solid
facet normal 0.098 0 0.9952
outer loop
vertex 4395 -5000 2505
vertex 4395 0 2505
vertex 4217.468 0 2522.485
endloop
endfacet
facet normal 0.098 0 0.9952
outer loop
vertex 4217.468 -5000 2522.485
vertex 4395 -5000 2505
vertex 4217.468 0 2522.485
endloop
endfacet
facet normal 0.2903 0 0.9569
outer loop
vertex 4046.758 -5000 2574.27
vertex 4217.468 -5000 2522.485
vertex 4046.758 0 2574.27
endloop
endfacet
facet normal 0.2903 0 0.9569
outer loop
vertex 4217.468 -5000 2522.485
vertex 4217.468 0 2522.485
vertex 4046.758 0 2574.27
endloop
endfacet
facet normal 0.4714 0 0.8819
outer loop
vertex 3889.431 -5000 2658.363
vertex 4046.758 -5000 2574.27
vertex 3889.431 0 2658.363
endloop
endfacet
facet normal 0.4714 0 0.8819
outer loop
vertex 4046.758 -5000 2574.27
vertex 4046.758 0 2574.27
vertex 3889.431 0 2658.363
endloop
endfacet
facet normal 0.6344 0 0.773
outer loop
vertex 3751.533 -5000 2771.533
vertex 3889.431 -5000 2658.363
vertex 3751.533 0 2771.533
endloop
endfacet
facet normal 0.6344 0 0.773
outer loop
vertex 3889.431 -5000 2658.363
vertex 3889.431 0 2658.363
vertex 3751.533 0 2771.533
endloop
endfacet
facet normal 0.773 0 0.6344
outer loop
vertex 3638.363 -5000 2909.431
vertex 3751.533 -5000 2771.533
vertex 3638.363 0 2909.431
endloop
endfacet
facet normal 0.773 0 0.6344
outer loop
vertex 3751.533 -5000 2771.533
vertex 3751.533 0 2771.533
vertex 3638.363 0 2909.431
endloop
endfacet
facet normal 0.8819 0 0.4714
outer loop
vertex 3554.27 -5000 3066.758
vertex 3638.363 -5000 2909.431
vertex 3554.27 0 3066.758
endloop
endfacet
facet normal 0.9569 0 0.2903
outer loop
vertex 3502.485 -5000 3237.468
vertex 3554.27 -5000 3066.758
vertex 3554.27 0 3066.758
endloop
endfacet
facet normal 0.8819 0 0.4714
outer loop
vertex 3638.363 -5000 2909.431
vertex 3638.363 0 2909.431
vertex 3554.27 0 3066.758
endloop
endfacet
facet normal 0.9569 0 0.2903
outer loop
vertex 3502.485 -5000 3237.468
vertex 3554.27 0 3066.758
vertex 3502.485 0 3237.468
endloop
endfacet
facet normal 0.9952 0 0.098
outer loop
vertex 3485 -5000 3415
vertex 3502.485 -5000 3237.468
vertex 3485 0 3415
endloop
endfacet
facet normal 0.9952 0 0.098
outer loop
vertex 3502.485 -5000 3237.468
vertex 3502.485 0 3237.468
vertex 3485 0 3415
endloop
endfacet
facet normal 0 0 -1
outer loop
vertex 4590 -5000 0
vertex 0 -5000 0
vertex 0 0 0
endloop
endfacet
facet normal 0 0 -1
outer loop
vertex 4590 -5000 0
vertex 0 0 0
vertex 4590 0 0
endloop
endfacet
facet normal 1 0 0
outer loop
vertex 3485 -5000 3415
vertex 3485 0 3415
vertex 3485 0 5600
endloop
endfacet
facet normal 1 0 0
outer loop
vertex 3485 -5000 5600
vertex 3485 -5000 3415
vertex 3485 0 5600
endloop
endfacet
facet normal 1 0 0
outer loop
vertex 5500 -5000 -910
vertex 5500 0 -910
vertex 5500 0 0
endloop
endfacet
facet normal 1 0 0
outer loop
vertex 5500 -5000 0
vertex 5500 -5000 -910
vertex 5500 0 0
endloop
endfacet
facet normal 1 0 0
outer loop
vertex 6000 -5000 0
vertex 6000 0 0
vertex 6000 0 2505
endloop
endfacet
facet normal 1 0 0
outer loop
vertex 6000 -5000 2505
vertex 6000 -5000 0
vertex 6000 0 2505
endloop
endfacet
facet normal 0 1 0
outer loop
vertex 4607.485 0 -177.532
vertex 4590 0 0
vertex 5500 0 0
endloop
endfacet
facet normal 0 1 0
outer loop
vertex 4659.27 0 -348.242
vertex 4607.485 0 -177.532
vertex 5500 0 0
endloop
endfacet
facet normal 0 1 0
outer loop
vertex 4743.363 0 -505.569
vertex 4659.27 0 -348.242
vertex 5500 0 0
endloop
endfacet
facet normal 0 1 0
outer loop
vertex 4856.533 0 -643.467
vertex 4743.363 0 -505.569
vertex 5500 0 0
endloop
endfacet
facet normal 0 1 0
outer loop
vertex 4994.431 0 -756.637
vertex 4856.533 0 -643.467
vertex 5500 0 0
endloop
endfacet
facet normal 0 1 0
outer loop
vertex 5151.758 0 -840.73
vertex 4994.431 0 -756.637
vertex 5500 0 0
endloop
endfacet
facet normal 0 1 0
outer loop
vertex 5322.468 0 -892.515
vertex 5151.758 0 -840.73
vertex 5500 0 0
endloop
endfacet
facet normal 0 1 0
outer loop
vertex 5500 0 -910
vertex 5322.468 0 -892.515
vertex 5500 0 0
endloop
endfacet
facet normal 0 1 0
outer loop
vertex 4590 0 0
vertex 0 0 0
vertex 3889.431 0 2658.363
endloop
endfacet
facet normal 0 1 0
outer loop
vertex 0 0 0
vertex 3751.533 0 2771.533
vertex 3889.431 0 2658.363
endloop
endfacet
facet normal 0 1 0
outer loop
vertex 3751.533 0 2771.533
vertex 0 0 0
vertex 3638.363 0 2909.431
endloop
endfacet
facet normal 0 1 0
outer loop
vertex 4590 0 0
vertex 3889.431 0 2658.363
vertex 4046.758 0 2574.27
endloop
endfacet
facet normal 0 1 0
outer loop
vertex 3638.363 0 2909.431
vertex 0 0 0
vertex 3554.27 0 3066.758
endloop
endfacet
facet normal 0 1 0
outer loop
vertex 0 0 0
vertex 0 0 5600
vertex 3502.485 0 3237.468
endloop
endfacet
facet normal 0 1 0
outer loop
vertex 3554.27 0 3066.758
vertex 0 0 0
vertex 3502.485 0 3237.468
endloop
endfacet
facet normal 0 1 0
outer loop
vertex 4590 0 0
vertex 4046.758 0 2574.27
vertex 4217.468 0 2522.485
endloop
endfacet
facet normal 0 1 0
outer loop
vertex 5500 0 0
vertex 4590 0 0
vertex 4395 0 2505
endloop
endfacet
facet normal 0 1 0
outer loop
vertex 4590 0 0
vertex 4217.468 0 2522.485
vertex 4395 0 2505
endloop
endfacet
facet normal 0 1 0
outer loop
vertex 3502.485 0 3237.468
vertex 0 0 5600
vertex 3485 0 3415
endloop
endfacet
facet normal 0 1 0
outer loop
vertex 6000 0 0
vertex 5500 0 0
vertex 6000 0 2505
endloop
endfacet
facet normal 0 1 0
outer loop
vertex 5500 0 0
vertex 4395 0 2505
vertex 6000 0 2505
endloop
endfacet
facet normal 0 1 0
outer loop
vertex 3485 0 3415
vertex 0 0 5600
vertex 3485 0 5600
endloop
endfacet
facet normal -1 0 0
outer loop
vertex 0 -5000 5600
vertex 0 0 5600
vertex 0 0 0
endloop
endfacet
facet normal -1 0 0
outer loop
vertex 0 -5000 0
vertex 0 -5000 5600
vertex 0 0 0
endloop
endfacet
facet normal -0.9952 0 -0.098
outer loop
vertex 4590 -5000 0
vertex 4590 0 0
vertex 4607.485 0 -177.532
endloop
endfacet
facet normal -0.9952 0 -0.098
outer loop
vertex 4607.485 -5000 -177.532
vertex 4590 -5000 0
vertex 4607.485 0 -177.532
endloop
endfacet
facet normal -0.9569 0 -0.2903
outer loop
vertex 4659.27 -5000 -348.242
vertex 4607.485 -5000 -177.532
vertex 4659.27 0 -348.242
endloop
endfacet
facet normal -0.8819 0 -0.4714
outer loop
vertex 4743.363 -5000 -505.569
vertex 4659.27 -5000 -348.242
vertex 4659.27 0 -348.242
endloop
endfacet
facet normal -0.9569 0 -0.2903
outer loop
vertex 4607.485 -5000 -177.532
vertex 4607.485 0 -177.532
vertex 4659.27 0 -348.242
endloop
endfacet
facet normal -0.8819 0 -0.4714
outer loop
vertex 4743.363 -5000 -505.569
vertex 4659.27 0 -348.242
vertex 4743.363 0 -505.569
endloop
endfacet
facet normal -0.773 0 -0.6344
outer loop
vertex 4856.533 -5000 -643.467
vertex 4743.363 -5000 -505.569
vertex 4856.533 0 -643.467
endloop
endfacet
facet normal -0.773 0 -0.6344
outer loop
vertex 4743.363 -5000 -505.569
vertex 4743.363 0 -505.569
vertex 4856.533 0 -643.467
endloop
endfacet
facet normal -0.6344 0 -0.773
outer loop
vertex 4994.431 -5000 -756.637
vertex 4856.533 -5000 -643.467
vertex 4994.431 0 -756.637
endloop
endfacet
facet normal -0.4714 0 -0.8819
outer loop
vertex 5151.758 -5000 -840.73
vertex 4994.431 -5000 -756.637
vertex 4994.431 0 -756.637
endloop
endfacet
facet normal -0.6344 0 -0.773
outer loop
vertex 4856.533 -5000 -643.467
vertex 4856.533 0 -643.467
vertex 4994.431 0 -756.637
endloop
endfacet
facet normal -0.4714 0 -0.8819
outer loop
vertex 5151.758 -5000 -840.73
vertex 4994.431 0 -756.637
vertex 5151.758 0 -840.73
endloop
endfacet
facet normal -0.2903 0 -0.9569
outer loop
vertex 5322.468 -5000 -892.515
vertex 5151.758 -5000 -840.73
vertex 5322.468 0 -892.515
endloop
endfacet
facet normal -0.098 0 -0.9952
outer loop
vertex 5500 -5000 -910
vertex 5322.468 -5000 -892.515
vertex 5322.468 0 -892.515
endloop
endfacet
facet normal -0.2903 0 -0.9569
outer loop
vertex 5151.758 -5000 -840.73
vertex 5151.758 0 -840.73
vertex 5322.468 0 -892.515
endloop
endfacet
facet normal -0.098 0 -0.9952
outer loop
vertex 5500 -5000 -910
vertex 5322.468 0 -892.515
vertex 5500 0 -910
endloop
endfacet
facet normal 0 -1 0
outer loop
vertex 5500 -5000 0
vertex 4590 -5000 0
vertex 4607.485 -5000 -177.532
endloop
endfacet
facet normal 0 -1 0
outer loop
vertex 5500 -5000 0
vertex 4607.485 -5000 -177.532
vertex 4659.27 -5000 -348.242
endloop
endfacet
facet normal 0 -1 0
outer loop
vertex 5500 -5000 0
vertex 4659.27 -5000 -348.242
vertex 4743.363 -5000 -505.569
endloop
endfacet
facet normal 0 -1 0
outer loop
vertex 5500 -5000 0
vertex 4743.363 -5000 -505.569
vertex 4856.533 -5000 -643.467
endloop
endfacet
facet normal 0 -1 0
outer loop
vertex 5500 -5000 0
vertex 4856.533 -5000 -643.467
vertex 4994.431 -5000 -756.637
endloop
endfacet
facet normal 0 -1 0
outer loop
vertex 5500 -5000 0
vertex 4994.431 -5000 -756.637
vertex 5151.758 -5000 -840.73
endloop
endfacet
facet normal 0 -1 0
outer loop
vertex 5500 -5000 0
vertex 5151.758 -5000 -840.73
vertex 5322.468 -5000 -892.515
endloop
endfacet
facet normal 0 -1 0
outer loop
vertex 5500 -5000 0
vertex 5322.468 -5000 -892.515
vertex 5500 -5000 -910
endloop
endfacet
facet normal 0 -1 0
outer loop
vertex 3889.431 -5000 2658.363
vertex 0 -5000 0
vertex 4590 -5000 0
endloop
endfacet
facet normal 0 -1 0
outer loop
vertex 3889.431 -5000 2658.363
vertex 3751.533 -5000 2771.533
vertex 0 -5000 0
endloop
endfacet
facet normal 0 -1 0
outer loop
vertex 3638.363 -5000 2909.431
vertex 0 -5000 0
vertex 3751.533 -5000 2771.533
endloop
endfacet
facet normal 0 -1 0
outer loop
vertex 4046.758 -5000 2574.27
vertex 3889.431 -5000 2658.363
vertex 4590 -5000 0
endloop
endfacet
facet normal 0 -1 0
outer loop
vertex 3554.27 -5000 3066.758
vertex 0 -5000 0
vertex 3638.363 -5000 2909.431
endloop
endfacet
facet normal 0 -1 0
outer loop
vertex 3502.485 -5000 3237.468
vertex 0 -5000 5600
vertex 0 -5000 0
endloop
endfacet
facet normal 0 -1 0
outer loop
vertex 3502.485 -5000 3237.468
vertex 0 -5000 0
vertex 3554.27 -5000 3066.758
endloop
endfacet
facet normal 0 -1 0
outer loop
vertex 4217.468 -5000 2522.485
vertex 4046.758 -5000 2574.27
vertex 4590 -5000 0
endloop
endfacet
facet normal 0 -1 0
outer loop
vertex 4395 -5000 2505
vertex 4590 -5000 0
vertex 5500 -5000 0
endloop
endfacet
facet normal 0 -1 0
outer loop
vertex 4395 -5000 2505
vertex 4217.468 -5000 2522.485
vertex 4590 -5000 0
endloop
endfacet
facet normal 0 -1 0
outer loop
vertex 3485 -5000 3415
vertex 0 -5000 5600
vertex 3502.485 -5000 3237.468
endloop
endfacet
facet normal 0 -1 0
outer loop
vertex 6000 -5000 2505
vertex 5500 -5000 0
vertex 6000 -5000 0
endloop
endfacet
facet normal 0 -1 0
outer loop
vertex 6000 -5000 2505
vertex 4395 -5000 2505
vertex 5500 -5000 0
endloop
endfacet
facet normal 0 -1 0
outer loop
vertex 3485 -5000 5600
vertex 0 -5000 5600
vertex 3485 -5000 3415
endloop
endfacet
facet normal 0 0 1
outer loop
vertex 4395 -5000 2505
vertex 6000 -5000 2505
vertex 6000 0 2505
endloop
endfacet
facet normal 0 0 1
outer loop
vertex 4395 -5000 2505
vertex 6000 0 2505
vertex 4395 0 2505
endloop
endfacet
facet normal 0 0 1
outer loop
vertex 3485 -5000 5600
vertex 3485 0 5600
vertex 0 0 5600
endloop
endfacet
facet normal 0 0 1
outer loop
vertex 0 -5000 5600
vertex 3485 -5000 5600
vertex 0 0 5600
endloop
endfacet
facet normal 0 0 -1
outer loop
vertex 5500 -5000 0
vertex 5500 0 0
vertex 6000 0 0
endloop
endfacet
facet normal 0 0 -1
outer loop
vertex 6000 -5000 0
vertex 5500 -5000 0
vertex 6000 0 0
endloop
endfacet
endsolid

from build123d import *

# Parameters (mm, degrees)
F1_DEPTH = 5000


with BuildPart() as f1:
    # F0 (on Front) → F1 (new body)
    with BuildSketch(Plane.XZ):
        with BuildLine():
            Line((3485, 5600), (0, 5600))
            Line((0, 5600), (0, 0))
            Line((0, 0), (4590, 0))
            ThreePointArc((4590, 0), (4856.532829, -643.467171), (5500, -910))
            Line((5500, -910), (5500, 0))
            Line((5500, 0), (6000, 0))
            Line((6000, 0), (6000, 2505))
            Line((6000, 2505), (5710, 2505))
            Line((5710, 2505), (5420, 2505))
            Line((5420, 2505), (5130, 2505))
            Line((5130, 2505), (4840, 2505))
            Line((4840, 2505), (4395, 2505))
            ThreePointArc((4395, 2505), (3751.532829, 2771.532829), (3485, 3415))
            Line((3485, 3415), (3485, 3860))
            Line((3485, 3860), (3485, 4150))
            Line((3485, 4150), (3485, 4440))
            Line((3485, 4440), (3485, 4730))
            Line((3485, 4730), (3485, 5020))
            Line((3485, 5020), (3485, 5310))
            Line((3485, 5310), (3485, 5600))
        make_face()
    extrude(amount=F1_DEPTH)


solid = f1.part
